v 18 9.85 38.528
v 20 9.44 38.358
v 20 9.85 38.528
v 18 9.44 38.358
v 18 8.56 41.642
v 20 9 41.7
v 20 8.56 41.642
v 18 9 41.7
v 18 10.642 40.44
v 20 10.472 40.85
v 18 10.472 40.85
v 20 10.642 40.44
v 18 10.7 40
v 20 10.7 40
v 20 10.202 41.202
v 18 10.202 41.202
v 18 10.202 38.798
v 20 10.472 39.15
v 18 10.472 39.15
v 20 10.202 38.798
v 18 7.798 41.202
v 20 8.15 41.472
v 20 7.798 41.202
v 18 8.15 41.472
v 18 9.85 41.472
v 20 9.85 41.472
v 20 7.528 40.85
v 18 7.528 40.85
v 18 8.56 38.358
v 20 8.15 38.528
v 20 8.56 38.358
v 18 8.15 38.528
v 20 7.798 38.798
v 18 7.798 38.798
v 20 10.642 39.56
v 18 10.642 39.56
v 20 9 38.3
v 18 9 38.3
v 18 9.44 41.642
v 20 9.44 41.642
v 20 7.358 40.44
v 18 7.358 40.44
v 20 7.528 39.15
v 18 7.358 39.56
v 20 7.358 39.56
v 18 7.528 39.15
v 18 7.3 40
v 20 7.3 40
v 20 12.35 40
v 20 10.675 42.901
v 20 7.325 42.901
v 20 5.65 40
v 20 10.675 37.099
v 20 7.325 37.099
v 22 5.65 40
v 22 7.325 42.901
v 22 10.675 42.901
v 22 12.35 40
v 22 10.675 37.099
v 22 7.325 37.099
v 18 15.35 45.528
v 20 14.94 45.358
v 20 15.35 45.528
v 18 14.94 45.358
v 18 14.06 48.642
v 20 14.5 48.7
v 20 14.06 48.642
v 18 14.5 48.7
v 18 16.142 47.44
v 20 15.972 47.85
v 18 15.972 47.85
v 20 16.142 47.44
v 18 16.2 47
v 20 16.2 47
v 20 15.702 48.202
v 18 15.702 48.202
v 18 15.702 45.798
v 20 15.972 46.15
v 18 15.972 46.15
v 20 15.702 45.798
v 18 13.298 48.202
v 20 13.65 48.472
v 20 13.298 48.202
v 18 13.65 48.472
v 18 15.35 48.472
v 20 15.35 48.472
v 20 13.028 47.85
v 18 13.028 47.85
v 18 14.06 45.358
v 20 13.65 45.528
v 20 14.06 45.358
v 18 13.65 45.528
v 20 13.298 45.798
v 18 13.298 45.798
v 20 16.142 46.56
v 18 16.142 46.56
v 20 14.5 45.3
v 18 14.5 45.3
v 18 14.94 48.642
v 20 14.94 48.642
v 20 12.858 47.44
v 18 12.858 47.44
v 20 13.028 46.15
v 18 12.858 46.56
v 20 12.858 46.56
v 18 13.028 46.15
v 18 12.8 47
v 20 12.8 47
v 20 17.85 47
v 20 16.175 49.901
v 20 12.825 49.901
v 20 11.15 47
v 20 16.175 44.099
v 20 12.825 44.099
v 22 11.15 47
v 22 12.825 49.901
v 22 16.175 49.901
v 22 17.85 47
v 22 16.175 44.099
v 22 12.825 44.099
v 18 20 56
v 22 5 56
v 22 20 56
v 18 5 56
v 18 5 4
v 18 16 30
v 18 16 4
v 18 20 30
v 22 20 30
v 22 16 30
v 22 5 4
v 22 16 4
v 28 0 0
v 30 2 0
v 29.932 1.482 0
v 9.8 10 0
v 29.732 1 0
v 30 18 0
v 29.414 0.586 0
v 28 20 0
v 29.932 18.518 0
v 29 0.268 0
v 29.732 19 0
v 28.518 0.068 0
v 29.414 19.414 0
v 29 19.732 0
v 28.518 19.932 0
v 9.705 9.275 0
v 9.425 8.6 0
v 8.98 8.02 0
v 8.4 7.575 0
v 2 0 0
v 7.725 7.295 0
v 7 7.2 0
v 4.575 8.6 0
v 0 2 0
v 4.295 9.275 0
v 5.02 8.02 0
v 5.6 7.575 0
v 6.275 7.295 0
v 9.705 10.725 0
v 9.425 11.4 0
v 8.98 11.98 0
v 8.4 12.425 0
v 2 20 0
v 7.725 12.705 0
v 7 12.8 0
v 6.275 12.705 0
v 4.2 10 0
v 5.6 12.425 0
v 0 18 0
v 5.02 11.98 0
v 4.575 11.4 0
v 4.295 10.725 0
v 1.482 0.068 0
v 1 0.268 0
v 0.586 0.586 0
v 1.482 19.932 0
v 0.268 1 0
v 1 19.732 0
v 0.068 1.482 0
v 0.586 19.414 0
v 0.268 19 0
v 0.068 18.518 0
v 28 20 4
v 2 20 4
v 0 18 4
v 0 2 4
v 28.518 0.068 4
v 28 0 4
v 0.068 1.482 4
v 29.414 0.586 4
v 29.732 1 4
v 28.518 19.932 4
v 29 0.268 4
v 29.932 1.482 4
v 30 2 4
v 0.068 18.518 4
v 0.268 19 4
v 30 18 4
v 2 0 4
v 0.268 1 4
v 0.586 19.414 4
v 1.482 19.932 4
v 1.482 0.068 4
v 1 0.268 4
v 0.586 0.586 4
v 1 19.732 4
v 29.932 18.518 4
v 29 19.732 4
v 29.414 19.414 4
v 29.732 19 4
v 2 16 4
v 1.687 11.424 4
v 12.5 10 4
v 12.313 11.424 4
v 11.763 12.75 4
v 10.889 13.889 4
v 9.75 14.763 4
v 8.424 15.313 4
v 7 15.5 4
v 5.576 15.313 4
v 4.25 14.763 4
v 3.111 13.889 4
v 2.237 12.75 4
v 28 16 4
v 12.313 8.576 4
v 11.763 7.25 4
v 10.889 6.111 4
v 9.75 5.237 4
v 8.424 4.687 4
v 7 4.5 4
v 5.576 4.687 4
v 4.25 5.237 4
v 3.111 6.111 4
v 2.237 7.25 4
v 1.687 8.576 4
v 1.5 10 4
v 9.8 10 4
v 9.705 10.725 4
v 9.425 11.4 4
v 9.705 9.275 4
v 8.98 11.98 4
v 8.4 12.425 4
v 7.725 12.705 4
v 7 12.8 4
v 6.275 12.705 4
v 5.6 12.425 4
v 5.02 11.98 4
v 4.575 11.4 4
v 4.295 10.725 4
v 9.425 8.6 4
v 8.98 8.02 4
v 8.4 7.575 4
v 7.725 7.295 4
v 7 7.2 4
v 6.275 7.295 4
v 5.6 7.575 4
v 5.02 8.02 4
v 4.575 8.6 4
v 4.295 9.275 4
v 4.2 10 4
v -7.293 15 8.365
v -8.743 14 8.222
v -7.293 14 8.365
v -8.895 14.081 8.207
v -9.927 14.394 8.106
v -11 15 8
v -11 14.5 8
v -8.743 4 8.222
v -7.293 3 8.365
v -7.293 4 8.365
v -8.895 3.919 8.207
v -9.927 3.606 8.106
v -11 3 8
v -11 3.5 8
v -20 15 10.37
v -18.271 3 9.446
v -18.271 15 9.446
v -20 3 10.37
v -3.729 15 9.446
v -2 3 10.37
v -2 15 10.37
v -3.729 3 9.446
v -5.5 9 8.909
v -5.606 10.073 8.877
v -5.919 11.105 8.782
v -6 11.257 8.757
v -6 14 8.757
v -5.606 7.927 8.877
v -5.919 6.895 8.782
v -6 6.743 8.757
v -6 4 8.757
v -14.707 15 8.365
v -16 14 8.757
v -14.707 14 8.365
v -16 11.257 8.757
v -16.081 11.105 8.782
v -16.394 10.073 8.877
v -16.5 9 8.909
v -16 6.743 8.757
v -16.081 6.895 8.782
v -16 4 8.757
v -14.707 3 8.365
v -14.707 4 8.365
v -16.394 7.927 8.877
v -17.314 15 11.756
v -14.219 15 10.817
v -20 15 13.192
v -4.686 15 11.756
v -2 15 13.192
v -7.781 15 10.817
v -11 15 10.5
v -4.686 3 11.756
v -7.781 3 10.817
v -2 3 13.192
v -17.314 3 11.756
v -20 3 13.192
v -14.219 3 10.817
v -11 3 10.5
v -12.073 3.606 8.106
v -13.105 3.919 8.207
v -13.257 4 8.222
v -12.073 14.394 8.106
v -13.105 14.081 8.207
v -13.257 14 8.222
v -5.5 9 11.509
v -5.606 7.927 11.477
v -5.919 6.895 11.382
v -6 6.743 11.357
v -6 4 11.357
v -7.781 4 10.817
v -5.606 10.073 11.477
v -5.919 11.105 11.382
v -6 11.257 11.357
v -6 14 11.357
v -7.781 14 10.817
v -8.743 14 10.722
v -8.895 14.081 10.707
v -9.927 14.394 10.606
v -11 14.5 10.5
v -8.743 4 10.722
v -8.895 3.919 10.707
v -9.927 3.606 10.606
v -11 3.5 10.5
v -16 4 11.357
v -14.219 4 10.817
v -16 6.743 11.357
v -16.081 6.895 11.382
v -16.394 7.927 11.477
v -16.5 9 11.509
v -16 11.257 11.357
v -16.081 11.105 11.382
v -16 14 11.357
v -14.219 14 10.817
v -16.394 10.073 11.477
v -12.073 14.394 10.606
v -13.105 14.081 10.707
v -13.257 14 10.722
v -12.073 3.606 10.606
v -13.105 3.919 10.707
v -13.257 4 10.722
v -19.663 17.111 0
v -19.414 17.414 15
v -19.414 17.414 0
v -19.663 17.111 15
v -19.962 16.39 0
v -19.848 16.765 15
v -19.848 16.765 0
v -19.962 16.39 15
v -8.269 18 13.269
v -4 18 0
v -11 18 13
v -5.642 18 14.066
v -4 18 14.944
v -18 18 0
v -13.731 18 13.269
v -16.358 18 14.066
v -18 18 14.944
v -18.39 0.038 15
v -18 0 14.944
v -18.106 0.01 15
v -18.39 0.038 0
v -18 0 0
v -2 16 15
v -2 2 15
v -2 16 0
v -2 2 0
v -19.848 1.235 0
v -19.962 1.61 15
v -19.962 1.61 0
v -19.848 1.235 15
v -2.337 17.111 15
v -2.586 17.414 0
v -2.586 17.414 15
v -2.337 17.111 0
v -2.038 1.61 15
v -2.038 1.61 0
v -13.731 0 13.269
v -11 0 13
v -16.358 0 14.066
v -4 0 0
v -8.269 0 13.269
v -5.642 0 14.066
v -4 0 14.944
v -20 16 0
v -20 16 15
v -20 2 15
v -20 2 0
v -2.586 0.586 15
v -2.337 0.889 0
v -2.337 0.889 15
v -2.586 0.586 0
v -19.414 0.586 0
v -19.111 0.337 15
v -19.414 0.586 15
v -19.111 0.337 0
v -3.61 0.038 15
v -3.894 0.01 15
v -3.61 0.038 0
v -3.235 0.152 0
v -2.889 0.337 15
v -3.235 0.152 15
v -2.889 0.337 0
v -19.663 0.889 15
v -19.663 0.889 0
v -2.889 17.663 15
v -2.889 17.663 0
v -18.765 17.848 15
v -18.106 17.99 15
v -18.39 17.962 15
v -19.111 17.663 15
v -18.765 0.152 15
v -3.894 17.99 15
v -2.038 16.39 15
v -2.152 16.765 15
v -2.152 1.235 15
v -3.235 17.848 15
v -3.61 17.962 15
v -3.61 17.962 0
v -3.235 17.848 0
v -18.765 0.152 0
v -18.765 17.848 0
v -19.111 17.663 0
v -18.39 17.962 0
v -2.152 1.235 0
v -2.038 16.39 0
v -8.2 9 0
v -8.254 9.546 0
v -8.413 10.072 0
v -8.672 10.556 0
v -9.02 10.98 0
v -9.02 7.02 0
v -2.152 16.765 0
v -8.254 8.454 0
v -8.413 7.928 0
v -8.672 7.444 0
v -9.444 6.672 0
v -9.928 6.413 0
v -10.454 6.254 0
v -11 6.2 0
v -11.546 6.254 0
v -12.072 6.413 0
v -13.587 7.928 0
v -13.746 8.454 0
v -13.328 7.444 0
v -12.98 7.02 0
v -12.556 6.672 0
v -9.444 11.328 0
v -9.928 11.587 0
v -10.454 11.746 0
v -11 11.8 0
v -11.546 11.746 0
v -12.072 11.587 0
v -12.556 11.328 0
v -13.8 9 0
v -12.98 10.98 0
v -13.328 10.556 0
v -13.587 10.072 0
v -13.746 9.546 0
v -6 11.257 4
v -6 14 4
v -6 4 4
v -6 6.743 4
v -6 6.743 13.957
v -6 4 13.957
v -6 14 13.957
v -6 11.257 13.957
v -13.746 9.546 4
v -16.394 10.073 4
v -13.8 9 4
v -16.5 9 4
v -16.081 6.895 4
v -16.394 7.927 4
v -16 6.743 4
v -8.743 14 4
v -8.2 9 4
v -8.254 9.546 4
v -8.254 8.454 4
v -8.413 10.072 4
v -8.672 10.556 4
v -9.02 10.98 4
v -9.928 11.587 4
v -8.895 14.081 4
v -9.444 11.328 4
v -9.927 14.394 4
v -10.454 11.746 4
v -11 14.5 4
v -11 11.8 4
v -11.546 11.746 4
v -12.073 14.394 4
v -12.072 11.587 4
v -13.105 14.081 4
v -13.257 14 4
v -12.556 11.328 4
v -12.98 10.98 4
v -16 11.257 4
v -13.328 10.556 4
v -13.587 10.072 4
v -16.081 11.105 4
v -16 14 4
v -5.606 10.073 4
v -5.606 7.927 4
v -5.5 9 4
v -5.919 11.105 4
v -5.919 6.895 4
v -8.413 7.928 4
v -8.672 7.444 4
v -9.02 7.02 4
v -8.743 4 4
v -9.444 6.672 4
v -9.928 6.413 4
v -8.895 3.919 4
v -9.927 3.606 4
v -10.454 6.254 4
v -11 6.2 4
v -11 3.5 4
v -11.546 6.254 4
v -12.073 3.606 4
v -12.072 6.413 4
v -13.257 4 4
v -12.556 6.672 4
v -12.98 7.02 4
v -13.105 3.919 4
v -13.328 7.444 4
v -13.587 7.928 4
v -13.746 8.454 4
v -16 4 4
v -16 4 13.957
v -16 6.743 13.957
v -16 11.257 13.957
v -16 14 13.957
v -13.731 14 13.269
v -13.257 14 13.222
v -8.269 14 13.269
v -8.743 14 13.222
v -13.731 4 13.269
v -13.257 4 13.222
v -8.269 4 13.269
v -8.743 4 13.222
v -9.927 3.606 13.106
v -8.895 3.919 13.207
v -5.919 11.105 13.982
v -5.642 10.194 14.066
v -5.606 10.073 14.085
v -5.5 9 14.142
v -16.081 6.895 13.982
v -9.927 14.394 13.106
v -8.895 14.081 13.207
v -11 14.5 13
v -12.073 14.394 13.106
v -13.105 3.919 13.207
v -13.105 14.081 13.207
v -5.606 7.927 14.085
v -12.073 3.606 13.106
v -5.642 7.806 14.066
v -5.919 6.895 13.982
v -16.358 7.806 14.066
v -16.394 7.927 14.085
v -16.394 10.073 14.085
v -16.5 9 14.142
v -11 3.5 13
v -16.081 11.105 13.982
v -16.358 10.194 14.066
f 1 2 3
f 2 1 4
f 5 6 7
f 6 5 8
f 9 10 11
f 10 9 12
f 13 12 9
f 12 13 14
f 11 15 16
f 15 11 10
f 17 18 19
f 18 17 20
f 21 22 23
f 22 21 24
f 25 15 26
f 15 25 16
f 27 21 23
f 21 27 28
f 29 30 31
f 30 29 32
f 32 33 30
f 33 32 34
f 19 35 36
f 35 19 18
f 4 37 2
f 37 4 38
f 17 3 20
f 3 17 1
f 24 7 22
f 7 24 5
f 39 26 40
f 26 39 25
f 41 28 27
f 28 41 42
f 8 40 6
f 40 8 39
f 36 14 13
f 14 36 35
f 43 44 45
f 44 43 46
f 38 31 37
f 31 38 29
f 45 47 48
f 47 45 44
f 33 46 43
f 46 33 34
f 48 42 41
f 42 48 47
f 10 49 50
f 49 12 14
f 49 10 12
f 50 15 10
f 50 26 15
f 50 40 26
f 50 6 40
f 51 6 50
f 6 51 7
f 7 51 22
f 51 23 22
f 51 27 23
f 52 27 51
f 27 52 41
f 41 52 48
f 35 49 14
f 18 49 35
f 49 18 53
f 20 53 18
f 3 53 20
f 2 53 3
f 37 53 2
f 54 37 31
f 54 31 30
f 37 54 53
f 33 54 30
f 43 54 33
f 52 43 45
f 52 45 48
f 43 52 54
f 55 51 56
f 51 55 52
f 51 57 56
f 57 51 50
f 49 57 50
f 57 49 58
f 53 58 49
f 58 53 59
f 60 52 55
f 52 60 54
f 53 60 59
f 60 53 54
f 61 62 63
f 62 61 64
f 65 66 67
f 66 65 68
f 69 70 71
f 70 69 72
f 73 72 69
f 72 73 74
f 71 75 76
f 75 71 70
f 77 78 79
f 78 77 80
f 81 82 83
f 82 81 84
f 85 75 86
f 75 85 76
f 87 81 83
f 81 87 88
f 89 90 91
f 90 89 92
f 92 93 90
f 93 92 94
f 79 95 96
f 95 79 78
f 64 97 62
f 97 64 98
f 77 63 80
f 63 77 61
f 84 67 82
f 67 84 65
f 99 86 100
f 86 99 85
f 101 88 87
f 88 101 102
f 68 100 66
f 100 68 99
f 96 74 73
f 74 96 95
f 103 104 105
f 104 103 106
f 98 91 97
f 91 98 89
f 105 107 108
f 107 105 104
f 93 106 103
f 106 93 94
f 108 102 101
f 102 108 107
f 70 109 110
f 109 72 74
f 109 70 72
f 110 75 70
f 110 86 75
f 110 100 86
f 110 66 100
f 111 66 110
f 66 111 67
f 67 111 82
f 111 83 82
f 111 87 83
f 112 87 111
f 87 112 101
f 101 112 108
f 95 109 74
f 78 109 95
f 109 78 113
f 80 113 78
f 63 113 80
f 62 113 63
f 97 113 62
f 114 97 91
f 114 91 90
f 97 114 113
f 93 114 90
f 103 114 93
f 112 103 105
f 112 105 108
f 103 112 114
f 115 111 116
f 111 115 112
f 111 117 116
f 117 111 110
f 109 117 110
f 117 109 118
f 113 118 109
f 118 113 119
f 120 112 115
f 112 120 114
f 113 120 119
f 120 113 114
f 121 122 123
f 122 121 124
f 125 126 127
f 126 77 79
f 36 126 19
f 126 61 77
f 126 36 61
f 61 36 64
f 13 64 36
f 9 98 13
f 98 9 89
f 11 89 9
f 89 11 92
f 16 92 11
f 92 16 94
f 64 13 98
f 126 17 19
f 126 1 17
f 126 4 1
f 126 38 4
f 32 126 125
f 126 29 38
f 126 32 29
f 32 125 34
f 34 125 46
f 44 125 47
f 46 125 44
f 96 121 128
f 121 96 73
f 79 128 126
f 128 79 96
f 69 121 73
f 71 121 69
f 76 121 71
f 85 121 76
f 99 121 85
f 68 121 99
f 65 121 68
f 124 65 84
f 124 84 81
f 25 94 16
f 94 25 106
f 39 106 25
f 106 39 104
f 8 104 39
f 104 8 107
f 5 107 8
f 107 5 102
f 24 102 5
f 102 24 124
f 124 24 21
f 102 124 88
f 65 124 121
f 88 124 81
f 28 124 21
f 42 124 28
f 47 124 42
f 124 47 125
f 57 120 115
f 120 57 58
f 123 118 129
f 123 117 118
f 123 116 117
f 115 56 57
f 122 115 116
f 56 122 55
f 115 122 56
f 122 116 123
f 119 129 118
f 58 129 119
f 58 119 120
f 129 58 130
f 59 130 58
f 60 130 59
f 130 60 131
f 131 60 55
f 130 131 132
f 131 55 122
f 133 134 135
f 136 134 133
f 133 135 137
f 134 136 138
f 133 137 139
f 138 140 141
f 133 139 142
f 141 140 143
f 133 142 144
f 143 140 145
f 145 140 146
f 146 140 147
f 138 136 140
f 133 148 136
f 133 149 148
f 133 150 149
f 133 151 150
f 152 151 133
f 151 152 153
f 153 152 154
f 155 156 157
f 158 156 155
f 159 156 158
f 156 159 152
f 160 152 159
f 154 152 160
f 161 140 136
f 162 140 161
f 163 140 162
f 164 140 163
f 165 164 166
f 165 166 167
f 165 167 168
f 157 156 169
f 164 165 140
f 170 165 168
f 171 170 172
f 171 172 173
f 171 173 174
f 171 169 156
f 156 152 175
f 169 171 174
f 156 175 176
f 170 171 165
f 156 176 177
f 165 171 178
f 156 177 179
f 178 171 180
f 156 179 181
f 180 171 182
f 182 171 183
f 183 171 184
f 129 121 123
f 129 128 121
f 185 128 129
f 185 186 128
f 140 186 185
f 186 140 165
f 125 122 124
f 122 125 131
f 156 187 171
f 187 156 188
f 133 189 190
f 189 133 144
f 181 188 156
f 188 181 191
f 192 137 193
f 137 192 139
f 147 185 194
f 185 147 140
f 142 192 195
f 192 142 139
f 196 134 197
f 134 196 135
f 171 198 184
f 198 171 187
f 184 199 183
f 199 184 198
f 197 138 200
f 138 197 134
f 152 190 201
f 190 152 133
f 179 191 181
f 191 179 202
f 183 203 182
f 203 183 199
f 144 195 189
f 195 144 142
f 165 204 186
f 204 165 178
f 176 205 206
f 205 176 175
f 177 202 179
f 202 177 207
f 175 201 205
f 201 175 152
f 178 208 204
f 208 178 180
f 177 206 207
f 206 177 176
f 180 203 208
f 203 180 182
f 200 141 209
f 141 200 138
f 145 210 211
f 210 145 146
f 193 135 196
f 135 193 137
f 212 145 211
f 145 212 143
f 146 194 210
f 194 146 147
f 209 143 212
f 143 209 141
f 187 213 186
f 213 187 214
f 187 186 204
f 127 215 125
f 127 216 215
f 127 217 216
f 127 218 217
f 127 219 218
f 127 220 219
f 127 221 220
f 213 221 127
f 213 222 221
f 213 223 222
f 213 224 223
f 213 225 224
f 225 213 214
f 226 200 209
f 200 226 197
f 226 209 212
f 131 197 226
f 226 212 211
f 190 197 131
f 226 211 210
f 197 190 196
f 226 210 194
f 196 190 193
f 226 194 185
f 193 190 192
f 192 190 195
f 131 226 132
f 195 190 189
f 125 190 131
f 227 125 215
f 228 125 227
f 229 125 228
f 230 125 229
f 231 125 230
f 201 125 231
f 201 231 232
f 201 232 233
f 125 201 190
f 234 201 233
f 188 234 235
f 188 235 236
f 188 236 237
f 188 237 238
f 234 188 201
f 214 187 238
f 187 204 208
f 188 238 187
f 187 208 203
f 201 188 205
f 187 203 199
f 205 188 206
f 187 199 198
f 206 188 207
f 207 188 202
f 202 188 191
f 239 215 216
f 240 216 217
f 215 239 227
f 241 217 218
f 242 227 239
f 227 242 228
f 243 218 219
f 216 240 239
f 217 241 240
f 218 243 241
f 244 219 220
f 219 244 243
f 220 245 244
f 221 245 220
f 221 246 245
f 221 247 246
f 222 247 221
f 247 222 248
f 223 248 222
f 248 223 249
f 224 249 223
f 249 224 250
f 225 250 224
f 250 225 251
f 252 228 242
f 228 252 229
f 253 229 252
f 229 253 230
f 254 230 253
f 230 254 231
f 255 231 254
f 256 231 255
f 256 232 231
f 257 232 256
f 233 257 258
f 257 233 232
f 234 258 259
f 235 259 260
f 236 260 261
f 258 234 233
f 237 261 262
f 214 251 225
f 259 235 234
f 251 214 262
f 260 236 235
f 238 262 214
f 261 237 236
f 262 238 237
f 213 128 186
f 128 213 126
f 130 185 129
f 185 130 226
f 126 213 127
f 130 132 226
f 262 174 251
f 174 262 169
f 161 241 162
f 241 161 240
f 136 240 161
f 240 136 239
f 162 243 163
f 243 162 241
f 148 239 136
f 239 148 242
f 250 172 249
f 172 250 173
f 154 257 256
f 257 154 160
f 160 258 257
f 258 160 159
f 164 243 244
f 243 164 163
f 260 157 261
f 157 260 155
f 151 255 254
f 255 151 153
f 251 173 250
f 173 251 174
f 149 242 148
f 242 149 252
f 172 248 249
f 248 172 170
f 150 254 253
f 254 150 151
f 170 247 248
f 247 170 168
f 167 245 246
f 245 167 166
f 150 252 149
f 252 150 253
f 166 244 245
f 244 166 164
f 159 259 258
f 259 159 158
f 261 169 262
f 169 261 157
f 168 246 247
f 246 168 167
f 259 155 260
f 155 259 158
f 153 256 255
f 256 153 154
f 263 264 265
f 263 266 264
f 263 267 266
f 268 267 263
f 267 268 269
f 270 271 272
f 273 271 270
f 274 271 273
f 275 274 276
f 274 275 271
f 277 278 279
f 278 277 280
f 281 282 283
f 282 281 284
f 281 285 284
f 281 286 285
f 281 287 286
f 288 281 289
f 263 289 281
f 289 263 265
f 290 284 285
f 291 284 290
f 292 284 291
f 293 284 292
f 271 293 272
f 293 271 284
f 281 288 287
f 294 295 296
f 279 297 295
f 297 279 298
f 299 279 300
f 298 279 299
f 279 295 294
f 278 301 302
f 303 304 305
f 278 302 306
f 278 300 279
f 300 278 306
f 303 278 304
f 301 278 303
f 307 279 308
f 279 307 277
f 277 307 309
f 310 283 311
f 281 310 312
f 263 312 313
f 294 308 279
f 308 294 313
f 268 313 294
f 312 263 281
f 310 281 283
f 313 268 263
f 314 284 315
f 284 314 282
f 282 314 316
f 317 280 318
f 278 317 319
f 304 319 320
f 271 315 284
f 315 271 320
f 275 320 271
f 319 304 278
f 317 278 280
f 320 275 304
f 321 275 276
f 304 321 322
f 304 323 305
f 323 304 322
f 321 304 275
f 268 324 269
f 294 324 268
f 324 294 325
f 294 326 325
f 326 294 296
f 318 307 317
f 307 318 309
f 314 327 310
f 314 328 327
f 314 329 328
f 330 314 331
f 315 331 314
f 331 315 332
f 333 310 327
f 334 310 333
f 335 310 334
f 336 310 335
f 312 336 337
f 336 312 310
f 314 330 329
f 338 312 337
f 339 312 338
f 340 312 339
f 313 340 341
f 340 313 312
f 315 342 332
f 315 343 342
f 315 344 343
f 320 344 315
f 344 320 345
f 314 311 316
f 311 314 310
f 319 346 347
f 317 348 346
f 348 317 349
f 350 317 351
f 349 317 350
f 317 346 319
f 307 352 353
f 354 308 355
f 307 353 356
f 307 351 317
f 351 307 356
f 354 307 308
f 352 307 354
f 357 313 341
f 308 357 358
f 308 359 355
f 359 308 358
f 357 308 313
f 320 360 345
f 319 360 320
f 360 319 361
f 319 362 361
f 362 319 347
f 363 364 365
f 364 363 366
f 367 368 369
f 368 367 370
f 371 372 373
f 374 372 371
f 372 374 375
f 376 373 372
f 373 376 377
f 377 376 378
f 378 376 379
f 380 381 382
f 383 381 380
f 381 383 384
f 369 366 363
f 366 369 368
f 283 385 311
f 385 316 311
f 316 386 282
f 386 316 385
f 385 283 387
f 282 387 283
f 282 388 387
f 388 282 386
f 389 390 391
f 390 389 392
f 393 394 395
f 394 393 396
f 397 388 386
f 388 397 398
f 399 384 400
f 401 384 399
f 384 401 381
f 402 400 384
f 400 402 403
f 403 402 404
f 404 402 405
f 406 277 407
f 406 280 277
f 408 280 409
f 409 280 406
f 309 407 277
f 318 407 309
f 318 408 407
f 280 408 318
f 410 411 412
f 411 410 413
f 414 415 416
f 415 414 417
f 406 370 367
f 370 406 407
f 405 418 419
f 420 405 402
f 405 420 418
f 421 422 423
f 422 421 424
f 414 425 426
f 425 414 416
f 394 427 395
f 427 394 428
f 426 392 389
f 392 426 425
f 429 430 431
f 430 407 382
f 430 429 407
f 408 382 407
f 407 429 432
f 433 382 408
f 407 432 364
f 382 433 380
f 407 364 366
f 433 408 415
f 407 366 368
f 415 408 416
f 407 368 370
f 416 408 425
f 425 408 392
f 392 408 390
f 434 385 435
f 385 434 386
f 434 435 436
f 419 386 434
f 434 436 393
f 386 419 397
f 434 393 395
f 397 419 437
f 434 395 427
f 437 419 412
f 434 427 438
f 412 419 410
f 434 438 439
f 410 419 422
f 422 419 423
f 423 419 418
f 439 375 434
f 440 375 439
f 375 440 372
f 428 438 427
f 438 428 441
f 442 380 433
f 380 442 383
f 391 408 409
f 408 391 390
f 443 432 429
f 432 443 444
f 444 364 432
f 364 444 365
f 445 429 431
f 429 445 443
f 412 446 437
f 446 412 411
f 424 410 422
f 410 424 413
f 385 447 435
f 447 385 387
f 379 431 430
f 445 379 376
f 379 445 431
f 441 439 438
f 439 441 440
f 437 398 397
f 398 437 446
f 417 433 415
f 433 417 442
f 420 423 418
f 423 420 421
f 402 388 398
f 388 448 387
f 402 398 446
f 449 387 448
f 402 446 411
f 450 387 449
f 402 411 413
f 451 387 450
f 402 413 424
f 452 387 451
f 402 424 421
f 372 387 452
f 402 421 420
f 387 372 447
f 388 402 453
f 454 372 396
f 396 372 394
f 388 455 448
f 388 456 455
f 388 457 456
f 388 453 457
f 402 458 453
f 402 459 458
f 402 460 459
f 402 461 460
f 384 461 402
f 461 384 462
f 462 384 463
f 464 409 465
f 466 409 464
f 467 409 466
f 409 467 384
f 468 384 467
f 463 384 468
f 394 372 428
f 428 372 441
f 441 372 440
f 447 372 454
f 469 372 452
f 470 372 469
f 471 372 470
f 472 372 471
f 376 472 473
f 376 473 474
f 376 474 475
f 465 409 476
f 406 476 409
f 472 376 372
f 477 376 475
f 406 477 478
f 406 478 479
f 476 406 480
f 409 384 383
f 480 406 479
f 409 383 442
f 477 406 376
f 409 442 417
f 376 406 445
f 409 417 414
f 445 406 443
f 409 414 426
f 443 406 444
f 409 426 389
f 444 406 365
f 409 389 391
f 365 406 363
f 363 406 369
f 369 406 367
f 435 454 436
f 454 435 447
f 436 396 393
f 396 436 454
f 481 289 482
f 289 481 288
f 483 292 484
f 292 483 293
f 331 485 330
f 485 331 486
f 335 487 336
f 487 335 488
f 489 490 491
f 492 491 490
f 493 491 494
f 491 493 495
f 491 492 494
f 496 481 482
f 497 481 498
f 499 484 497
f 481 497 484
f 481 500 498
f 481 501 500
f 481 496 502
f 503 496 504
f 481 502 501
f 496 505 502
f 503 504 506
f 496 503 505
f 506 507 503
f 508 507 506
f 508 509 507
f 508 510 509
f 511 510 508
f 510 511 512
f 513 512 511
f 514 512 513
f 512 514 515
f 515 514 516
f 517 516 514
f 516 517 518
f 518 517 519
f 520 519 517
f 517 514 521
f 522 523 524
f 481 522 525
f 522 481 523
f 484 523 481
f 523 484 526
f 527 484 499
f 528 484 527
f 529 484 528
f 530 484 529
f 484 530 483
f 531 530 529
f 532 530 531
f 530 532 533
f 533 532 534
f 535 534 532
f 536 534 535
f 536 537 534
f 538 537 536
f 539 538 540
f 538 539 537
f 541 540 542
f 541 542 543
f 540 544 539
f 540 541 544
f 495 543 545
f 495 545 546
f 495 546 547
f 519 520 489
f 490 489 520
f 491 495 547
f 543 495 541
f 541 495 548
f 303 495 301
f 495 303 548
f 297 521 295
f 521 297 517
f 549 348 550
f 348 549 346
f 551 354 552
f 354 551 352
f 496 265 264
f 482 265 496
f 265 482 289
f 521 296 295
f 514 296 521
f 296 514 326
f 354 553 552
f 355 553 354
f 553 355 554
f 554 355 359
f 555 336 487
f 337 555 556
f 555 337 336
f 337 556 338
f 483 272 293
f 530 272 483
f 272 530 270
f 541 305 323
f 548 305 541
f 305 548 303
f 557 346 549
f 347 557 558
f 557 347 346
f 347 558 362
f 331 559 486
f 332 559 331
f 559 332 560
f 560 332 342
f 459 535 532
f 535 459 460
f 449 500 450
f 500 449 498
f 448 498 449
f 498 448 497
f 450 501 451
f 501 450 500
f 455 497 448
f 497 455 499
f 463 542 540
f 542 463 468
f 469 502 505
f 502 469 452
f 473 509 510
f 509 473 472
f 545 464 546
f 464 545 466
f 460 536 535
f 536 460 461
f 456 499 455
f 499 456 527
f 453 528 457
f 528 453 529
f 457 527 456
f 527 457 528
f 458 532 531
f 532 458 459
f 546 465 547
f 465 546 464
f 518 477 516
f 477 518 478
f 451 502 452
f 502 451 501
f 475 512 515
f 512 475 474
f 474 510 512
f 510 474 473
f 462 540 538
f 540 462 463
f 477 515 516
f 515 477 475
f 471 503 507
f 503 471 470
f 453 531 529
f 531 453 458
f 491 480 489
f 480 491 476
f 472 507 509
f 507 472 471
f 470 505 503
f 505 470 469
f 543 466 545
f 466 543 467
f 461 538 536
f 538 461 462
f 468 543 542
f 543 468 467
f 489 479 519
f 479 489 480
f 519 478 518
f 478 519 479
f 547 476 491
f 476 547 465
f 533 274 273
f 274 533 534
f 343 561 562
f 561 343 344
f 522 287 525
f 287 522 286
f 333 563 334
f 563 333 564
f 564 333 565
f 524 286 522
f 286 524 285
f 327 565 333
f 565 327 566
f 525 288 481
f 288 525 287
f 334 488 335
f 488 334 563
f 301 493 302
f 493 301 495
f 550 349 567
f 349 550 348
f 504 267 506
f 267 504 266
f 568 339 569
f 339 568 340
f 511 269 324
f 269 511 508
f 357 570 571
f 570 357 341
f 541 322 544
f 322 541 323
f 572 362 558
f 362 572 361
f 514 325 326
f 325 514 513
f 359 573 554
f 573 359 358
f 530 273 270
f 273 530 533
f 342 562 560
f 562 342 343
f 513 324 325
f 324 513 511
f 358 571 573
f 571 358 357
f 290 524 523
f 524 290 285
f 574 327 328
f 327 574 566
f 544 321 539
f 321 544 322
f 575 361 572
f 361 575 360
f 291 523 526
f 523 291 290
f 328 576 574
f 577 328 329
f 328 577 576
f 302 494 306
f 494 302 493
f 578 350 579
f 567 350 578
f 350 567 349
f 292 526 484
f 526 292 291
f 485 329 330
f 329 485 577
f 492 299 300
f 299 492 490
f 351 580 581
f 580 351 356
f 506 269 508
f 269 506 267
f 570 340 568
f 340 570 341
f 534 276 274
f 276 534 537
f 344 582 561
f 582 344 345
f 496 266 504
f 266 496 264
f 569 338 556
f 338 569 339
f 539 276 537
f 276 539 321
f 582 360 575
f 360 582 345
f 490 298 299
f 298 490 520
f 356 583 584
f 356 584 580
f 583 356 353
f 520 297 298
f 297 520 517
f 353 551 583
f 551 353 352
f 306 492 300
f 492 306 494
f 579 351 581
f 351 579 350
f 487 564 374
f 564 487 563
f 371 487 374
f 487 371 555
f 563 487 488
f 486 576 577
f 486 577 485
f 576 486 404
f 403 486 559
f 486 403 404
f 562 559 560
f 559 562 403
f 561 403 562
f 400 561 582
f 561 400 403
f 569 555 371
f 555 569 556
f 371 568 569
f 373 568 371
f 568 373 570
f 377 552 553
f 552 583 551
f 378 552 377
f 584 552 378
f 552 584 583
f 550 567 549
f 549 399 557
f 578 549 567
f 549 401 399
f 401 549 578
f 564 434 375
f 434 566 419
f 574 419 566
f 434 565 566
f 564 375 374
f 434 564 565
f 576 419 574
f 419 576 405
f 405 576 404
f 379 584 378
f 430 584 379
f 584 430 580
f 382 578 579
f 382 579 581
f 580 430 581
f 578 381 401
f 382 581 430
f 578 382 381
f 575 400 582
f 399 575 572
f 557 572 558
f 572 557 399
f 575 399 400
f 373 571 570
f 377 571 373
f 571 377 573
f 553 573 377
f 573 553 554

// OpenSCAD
$fn=24;

m3h=3.4;         // hole for an m3 screw

mgn12h=[46,27,13];          // carrige sizes
idler_total_dia=11;         // idler pulley's diameter with it's collars
idler_center_offset=4;      // where the idler's shaft is, in relation to 2020 frame

cablechain_min_bottom_from_frame=30;
cablechain_width=26;
cablechain_hole_1=[4,10,0];
cablechain_hole_2=[9.5,17,0];
cablechain_mount_width=15;

max_width=mgn12h[2]+20-3;     // 2020 frame + mgn12 heigth

module nut3(h=4) {
    hull() {
        for (r=[0:60:300]) rotate([0,0,r]) translate([3.3,0,0]) cylinder(d=0.1,h=h, $fn=2);
    }
}

module bottom() {
    hull() {
        translate([2,2,0]) cylinder(d=4,h=4);
        translate([2,18,0]) cylinder(d=4,h=4);
        translate([max_width-2,2,0]) cylinder(d=4,h=4);
        translate([max_width-2,18,0]) cylinder(d=4,h=4);
    }
}

*bottom();

module cablechain_column() {
    translate([4,0,0]) rotate([0,-90,0]) {
        difference() {
            cube([cablechain_min_bottom_from_frame+cablechain_width
                  ,cablechain_mount_width
                  ,4]);
            
            translate([cablechain_min_bottom_from_frame,0,-1]) 
            mirror([0,1,0]) rotate([0,0,-90]) {
                translate(cablechain_hole_1) cylinder(d=m3h,h=6);
                translate(cablechain_hole_1+[0,0,-1]) nut3();
                translate(cablechain_hole_2) cylinder(d=m3h,h=6);
                translate(cablechain_hole_2+[0,0,-1]) nut3();
            }
        }         
    }
}

*cablechain_column();

module cablechain_mount_top() {
    difference() {
        union() {
            bottom();
            translate([max_width*0.6,5,0]) cablechain_column();
            hull() {
                translate([max_width*0.6,16,0])
                    cube([4,4,cablechain_min_bottom_from_frame]);
                translate([2,16,0]) cube([max_width-4,4,4]);
            }
        }
        
        translate([7,10,-1]) cylinder(d=5.6,10);
        translate([7,10,4]) cylinder(d=11,10);
    }
}

cablechain_mount_top();

module cablechain_mount_bottom() {
    $fn=32;
    difference() {
        hull() {
            translate([2,2,0]) cylinder(d=4,h=15);
            translate([2,16,0]) cylinder(d=4,h=15);
            translate([16,2,0]) cylinder(d=4,h=15);
            translate([16,16,0]) cylinder(d=4,h=15);
        }
        translate([4,4,4]) cube([10,10,15]);
        translate([9,9,-1]) cylinder(d=5.6,h=17);
        translate([9,9,4]) cylinder(d=11,h=17);
        
        translate([9,3,8+19]) rotate([-90,0,0]) difference() {
            cylinder(d=38,h=12);
            translate([0,0,-1]) cylinder(d=33,h=14);
        }
        
        translate([9,-1,8+19]) rotate([-90,0,0]) cylinder(d=28,h=20);
    }
}

translate([-20,0,0]) cablechain_mount_bottom();
